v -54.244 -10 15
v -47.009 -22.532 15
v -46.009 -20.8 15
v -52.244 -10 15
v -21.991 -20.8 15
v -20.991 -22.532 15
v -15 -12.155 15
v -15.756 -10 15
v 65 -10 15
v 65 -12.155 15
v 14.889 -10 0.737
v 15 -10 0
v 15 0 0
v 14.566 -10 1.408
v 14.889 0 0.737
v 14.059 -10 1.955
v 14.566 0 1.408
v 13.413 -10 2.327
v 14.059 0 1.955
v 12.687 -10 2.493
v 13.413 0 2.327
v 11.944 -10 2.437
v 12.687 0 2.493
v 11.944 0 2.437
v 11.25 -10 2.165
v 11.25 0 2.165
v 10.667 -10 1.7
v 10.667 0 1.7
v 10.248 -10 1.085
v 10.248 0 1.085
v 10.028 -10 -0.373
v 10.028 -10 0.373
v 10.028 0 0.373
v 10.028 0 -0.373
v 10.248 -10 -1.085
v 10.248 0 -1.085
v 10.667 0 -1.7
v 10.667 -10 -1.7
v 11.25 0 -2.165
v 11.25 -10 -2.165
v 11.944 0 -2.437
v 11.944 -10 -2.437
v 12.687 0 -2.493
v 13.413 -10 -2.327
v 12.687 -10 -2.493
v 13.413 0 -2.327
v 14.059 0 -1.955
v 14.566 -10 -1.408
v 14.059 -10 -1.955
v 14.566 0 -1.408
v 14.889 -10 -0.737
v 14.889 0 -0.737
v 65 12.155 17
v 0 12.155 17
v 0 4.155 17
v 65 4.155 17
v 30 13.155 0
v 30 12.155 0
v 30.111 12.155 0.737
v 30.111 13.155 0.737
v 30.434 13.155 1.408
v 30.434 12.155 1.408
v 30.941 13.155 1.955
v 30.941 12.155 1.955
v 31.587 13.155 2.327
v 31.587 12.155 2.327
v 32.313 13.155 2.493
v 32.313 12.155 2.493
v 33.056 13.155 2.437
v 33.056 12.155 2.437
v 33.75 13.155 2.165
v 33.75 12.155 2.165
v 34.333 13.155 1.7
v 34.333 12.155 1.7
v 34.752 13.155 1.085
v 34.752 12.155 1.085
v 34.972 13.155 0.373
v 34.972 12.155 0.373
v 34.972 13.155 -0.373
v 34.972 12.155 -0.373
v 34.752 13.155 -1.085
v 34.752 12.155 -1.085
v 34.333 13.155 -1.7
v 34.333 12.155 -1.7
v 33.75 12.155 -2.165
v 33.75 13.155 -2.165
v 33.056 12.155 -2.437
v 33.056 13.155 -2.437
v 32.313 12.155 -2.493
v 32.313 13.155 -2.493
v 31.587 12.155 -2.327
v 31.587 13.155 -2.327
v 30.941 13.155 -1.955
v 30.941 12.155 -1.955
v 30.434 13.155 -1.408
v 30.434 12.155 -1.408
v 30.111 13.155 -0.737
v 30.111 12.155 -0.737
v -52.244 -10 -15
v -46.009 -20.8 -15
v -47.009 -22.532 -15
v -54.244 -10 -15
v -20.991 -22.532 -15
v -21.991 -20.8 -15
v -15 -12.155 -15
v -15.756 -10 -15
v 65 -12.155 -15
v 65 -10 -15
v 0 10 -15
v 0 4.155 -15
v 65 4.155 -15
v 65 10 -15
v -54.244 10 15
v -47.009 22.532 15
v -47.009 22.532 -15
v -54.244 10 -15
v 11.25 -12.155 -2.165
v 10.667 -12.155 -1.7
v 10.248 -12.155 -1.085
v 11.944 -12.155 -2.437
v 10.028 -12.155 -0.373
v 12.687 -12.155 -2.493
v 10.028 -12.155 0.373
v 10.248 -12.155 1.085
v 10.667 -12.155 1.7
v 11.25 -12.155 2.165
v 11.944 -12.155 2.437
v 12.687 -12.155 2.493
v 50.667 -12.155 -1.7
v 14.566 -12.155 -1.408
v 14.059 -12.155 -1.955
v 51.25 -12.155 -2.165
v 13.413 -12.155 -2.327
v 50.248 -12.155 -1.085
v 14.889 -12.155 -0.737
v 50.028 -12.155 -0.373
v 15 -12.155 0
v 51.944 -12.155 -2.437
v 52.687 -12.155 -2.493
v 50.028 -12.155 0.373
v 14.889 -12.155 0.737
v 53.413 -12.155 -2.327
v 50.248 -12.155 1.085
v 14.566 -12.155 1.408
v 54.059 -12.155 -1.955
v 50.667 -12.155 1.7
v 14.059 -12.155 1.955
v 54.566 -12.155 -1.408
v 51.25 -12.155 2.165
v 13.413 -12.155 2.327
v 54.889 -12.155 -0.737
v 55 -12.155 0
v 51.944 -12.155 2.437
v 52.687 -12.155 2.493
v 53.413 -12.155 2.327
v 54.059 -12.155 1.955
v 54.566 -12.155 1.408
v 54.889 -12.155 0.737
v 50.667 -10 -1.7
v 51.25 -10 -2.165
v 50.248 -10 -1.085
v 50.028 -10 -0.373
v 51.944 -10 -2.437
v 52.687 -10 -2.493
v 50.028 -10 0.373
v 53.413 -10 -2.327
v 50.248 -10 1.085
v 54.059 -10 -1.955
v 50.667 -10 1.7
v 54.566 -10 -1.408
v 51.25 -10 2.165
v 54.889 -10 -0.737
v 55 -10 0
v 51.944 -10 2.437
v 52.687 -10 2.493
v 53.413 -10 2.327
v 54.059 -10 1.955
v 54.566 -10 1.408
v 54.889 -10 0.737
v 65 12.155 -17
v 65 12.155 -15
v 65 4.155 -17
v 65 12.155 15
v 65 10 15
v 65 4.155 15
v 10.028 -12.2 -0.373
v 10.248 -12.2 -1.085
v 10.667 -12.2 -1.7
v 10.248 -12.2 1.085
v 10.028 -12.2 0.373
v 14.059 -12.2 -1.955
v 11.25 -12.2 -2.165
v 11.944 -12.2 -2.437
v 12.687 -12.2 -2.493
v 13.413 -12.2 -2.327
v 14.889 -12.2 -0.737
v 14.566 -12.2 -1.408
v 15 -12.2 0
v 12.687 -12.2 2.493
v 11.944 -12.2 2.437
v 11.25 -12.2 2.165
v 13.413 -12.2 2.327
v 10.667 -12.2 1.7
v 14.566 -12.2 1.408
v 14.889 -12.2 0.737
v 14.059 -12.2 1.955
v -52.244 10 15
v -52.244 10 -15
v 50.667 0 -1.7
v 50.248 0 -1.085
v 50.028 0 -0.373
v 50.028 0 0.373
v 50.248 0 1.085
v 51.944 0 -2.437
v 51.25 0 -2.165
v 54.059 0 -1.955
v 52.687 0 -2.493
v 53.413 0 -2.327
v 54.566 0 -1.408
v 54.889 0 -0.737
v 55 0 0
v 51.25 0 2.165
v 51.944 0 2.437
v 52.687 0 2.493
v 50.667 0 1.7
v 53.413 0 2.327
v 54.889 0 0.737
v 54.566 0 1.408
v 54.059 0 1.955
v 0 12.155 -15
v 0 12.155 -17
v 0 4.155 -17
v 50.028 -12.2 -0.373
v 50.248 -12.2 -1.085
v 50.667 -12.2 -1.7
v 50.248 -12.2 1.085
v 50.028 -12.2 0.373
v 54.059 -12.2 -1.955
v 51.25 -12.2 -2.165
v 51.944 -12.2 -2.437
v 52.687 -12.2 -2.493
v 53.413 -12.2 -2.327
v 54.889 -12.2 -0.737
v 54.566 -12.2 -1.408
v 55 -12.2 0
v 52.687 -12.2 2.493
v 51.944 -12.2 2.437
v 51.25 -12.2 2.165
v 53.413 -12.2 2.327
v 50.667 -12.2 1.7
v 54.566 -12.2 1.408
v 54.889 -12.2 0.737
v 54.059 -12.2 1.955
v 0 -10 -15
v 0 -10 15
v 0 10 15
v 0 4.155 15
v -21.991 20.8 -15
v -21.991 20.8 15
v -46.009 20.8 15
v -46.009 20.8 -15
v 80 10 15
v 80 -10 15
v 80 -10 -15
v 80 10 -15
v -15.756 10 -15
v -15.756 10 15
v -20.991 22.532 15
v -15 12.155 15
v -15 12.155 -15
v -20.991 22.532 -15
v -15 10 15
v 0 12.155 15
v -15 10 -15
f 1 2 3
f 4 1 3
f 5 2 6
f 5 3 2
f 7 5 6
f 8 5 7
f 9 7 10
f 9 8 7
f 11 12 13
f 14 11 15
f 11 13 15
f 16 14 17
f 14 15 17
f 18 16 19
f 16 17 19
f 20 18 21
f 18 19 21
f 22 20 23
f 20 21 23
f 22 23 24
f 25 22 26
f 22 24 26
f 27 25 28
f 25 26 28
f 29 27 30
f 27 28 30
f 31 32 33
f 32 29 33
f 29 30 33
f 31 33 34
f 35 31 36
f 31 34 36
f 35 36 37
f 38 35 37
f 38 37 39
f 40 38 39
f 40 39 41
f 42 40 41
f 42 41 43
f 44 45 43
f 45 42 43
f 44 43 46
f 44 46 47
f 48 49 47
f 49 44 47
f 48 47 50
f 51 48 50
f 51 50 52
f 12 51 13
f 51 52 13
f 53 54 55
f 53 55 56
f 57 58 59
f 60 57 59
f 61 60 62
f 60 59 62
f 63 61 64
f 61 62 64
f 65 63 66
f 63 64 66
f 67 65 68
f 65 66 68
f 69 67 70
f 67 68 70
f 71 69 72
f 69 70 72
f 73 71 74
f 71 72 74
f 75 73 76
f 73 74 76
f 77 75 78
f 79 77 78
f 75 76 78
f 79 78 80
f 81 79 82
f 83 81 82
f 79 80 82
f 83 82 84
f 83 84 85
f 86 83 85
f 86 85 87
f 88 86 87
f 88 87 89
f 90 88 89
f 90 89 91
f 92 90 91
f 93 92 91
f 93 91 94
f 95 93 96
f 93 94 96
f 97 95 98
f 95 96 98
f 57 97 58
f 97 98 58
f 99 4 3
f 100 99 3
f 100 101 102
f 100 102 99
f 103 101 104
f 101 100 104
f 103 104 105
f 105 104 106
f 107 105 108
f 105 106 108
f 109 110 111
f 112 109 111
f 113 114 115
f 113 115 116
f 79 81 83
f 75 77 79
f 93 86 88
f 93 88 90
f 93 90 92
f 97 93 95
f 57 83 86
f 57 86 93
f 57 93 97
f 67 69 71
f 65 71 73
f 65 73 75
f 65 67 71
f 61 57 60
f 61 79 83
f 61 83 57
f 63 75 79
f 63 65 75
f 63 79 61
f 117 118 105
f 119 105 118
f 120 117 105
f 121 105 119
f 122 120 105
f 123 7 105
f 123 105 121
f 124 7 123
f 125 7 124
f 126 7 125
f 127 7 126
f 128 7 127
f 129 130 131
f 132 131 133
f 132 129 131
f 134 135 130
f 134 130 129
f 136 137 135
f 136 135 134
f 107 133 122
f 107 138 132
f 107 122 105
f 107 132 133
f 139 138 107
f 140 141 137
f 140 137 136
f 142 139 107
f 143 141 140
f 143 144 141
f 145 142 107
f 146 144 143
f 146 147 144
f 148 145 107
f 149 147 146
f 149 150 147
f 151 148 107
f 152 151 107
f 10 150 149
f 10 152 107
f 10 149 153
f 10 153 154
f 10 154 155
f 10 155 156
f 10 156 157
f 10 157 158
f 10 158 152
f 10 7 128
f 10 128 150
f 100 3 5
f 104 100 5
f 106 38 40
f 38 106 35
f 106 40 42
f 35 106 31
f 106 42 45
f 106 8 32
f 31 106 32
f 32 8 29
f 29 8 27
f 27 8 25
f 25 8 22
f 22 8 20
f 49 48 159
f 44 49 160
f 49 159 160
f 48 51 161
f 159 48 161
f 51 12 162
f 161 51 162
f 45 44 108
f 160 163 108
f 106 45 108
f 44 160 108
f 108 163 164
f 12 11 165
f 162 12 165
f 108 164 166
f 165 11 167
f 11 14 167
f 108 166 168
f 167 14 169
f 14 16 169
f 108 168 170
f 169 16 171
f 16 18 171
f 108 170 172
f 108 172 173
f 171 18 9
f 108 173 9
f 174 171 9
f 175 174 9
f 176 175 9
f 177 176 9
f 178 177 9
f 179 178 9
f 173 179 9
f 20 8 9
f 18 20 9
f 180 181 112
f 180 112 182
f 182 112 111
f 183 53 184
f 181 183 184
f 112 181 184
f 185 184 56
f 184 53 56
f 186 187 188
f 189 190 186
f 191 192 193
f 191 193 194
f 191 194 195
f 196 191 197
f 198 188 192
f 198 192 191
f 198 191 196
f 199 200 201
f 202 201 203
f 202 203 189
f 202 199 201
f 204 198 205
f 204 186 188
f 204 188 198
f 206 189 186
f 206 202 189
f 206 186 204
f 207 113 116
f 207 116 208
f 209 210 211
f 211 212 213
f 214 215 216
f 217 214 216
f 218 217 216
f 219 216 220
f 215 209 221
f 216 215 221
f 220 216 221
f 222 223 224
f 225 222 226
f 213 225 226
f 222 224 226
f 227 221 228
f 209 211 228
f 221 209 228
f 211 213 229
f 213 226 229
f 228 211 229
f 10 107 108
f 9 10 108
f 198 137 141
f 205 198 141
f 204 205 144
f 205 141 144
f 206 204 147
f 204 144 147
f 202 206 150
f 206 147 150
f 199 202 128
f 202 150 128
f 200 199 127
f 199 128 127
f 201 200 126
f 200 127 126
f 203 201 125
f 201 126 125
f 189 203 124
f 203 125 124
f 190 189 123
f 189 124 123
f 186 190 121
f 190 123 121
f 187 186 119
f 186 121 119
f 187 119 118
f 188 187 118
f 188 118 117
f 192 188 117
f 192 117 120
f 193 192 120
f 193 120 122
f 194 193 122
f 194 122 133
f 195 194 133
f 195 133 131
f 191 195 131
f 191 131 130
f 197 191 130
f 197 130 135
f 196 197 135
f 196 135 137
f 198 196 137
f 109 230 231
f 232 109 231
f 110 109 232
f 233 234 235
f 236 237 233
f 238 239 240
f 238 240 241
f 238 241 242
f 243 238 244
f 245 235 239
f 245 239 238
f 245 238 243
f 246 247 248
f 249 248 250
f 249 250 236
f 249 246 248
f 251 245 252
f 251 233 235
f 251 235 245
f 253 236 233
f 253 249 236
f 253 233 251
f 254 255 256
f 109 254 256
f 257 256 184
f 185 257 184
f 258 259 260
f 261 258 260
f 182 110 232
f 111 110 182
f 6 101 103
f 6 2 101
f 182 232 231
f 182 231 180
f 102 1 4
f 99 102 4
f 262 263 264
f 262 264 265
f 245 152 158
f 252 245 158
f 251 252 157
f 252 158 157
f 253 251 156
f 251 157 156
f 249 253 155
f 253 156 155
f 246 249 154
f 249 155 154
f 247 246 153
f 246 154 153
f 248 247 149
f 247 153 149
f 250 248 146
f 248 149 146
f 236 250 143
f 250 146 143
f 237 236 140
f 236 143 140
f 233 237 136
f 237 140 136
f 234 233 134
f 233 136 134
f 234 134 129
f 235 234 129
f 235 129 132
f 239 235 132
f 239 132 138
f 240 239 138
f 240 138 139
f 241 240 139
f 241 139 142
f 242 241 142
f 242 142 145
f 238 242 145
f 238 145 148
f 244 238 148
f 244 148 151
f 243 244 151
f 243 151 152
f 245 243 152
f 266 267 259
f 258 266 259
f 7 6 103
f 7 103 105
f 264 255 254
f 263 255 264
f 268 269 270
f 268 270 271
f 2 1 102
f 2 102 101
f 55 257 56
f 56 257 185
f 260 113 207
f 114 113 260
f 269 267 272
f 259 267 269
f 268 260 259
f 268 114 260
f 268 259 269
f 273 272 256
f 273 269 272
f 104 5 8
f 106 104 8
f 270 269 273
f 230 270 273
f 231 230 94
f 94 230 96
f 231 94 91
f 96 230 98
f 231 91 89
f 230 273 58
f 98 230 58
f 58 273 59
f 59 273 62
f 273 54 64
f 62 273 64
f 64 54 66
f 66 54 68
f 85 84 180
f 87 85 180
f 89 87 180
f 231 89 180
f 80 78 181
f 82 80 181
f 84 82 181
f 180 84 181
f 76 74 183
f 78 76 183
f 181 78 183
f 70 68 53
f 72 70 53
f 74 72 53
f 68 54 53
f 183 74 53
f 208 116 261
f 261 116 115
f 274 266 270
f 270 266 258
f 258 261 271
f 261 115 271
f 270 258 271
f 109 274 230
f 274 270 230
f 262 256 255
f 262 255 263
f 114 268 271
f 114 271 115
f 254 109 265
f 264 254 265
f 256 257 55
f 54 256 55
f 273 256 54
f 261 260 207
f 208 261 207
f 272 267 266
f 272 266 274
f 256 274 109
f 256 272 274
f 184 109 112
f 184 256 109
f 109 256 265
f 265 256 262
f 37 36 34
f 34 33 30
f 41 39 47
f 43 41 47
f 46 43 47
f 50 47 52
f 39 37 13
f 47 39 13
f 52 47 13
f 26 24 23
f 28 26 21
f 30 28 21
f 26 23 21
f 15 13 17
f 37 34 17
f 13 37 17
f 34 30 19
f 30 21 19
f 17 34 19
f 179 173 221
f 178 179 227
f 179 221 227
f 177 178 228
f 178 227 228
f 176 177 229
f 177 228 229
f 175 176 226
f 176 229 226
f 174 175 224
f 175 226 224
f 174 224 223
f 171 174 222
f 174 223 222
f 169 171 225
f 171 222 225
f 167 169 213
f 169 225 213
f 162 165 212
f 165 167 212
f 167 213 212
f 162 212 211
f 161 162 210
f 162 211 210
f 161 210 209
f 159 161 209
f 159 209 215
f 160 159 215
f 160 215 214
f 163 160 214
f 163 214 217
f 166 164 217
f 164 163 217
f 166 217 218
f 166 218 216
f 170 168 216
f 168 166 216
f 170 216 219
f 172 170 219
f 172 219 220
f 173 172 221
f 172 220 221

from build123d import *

# Parameters (mm, degrees)
F0_W      = 80
F0_H      = 20
F1_DEPTH  = 15
F3_DEPTH  = 50
F5_DEPTH  = 15
F7_W      = 80
F7_H      = 2.1551362713
F8_DEPTH  = 15
F9_W      = 14.0510366764
F9_H      = 20
F10_DEPTH = 20
F12_W     = 40
F12_H     = 20
F13_DEPTH = 15
F16_R     = 2.5
F17_DEPTH = 12.2
F19_W     = 65
F19_H     = 8
F20_DEPTH = 2
F22_W     = 65
F22_H     = 8
F23_DEPTH = 2
F25_R     = 2.5
F26_DEPTH = 1


# Not quite as in the source:
# - a feature of the source that left no trace in its solid (it failed there, or was rolled back) is left out


with BuildPart() as f1:
    # F0 (on Top) → F1 (new body, symmetric)
    with BuildSketch(Plane.XY):
        with Locations((40, 0)):
            Rectangle(F0_W, F0_H)
    extrude(amount=F1_DEPTH, both=True)


with BuildPart() as f3:
    # F2 (on Top) → F3 (new body, symmetric)
    with BuildSketch(Plane.XY):
        Polygon((-21.9911144009, -20.8), (-9.9822288017, 0), (-21.9911144009, 20.8), (-46.0088855991, 20.8), (-58.0177711983, 0), (-46.0088855991, -20.8), align=None)
    extrude(amount=F3_DEPTH, both=True)


with BuildPart() as f5:
    # F4 (on Top) → F5 (new body, symmetric)
    with BuildSketch(Plane.XY):
        Polygon((-20.9911144009, -22.5320508076), (-7.9822288017, 0), (-20.9911144009, 22.5320508076), (-47.0088855991, 22.5320508076), (-60.0177711983, 0), (-47.0088855991, -22.5320508076), align=None)
    extrude(amount=F5_DEPTH, both=True)

    # F6: cut F3
    add(f3.part, mode=Mode.SUBTRACT)

    # F7 (on Top) → F8, piece 2 (join, symmetric)
    with BuildSketch(Plane.XY):
        with Locations((25, -11.0775681357)):
            Rectangle(F7_W, F7_H)
    extrude(amount=F8_DEPTH, both=True)


with BuildPart() as f8:
    # F7 (on Top) → F8 (new body, symmetric)
    with BuildSketch(Plane.XY):
        with Locations((25, 11.0775681357)):
            Rectangle(F7_W, F7_H)
    extrude(amount=F8_DEPTH, both=True)

    # F19 (on offset) → F20 (join)
    with BuildSketch(Plane.XY.offset(15)):
        with Locations((32.5, 8.1551362713)):
            Rectangle(F19_W, F19_H)
    extrude(amount=F20_DEPTH)

    # F22 (on offset) → F23 (join)
    with BuildSketch(Plane(origin=(0, 0, -15), x_dir=(1, 0, 0), z_dir=(0, 0, -1))):
        with Locations((32.5, -8.1551362713)):
            Rectangle(F22_W, F22_H)
    extrude(amount=F23_DEPTH)


with BuildPart() as f10:
    # F9 (on Top) → F10 (new body, symmetric)
    with BuildSketch(Plane.XY):
        with Locations((-10.8901850181, 0)):
            Rectangle(F9_W, F9_H)
    extrude(amount=F10_DEPTH, both=True)


with BuildPart() as f5_1:
    add(f5.part)

    # F11: cut F10
    add(f10.part, mode=Mode.SUBTRACT)


with BuildPart() as f13:
    # F12 (on Top) → F13 (new body, symmetric)
    with BuildSketch(Plane.XY):
        with Locations((-50.3287625449, 0)):
            Rectangle(F12_W, F12_H)
    extrude(amount=F13_DEPTH, both=True)


with BuildPart() as f5_2:
    add(f5_1.part)

    # F14: cut F13
    add(f13.part, mode=Mode.SUBTRACT)

    # F16 (on Front) → F17 (join)
    with BuildSketch(Plane.XZ):
        with Locations((12.5, 0)):
            Circle(F16_R)
        with Locations((52.5, 0)):
            Circle(F16_R)
    extrude(amount=F17_DEPTH)


with BuildPart() as f8_1:
    add(f8.part)

    # F24: union F5
    add(f5_2.part)

    # F25 (on face) → F26 (join)
    with BuildSketch(Plane(origin=(0, 12.1551362713, 0), x_dir=(-1, 0, 0), z_dir=(0, 1, 0))):
        with Locations((-32.5, 0)):
            Circle(F25_R)
    extrude(amount=F26_DEPTH)


solid = Compound([f1.part, f8_1.part])
